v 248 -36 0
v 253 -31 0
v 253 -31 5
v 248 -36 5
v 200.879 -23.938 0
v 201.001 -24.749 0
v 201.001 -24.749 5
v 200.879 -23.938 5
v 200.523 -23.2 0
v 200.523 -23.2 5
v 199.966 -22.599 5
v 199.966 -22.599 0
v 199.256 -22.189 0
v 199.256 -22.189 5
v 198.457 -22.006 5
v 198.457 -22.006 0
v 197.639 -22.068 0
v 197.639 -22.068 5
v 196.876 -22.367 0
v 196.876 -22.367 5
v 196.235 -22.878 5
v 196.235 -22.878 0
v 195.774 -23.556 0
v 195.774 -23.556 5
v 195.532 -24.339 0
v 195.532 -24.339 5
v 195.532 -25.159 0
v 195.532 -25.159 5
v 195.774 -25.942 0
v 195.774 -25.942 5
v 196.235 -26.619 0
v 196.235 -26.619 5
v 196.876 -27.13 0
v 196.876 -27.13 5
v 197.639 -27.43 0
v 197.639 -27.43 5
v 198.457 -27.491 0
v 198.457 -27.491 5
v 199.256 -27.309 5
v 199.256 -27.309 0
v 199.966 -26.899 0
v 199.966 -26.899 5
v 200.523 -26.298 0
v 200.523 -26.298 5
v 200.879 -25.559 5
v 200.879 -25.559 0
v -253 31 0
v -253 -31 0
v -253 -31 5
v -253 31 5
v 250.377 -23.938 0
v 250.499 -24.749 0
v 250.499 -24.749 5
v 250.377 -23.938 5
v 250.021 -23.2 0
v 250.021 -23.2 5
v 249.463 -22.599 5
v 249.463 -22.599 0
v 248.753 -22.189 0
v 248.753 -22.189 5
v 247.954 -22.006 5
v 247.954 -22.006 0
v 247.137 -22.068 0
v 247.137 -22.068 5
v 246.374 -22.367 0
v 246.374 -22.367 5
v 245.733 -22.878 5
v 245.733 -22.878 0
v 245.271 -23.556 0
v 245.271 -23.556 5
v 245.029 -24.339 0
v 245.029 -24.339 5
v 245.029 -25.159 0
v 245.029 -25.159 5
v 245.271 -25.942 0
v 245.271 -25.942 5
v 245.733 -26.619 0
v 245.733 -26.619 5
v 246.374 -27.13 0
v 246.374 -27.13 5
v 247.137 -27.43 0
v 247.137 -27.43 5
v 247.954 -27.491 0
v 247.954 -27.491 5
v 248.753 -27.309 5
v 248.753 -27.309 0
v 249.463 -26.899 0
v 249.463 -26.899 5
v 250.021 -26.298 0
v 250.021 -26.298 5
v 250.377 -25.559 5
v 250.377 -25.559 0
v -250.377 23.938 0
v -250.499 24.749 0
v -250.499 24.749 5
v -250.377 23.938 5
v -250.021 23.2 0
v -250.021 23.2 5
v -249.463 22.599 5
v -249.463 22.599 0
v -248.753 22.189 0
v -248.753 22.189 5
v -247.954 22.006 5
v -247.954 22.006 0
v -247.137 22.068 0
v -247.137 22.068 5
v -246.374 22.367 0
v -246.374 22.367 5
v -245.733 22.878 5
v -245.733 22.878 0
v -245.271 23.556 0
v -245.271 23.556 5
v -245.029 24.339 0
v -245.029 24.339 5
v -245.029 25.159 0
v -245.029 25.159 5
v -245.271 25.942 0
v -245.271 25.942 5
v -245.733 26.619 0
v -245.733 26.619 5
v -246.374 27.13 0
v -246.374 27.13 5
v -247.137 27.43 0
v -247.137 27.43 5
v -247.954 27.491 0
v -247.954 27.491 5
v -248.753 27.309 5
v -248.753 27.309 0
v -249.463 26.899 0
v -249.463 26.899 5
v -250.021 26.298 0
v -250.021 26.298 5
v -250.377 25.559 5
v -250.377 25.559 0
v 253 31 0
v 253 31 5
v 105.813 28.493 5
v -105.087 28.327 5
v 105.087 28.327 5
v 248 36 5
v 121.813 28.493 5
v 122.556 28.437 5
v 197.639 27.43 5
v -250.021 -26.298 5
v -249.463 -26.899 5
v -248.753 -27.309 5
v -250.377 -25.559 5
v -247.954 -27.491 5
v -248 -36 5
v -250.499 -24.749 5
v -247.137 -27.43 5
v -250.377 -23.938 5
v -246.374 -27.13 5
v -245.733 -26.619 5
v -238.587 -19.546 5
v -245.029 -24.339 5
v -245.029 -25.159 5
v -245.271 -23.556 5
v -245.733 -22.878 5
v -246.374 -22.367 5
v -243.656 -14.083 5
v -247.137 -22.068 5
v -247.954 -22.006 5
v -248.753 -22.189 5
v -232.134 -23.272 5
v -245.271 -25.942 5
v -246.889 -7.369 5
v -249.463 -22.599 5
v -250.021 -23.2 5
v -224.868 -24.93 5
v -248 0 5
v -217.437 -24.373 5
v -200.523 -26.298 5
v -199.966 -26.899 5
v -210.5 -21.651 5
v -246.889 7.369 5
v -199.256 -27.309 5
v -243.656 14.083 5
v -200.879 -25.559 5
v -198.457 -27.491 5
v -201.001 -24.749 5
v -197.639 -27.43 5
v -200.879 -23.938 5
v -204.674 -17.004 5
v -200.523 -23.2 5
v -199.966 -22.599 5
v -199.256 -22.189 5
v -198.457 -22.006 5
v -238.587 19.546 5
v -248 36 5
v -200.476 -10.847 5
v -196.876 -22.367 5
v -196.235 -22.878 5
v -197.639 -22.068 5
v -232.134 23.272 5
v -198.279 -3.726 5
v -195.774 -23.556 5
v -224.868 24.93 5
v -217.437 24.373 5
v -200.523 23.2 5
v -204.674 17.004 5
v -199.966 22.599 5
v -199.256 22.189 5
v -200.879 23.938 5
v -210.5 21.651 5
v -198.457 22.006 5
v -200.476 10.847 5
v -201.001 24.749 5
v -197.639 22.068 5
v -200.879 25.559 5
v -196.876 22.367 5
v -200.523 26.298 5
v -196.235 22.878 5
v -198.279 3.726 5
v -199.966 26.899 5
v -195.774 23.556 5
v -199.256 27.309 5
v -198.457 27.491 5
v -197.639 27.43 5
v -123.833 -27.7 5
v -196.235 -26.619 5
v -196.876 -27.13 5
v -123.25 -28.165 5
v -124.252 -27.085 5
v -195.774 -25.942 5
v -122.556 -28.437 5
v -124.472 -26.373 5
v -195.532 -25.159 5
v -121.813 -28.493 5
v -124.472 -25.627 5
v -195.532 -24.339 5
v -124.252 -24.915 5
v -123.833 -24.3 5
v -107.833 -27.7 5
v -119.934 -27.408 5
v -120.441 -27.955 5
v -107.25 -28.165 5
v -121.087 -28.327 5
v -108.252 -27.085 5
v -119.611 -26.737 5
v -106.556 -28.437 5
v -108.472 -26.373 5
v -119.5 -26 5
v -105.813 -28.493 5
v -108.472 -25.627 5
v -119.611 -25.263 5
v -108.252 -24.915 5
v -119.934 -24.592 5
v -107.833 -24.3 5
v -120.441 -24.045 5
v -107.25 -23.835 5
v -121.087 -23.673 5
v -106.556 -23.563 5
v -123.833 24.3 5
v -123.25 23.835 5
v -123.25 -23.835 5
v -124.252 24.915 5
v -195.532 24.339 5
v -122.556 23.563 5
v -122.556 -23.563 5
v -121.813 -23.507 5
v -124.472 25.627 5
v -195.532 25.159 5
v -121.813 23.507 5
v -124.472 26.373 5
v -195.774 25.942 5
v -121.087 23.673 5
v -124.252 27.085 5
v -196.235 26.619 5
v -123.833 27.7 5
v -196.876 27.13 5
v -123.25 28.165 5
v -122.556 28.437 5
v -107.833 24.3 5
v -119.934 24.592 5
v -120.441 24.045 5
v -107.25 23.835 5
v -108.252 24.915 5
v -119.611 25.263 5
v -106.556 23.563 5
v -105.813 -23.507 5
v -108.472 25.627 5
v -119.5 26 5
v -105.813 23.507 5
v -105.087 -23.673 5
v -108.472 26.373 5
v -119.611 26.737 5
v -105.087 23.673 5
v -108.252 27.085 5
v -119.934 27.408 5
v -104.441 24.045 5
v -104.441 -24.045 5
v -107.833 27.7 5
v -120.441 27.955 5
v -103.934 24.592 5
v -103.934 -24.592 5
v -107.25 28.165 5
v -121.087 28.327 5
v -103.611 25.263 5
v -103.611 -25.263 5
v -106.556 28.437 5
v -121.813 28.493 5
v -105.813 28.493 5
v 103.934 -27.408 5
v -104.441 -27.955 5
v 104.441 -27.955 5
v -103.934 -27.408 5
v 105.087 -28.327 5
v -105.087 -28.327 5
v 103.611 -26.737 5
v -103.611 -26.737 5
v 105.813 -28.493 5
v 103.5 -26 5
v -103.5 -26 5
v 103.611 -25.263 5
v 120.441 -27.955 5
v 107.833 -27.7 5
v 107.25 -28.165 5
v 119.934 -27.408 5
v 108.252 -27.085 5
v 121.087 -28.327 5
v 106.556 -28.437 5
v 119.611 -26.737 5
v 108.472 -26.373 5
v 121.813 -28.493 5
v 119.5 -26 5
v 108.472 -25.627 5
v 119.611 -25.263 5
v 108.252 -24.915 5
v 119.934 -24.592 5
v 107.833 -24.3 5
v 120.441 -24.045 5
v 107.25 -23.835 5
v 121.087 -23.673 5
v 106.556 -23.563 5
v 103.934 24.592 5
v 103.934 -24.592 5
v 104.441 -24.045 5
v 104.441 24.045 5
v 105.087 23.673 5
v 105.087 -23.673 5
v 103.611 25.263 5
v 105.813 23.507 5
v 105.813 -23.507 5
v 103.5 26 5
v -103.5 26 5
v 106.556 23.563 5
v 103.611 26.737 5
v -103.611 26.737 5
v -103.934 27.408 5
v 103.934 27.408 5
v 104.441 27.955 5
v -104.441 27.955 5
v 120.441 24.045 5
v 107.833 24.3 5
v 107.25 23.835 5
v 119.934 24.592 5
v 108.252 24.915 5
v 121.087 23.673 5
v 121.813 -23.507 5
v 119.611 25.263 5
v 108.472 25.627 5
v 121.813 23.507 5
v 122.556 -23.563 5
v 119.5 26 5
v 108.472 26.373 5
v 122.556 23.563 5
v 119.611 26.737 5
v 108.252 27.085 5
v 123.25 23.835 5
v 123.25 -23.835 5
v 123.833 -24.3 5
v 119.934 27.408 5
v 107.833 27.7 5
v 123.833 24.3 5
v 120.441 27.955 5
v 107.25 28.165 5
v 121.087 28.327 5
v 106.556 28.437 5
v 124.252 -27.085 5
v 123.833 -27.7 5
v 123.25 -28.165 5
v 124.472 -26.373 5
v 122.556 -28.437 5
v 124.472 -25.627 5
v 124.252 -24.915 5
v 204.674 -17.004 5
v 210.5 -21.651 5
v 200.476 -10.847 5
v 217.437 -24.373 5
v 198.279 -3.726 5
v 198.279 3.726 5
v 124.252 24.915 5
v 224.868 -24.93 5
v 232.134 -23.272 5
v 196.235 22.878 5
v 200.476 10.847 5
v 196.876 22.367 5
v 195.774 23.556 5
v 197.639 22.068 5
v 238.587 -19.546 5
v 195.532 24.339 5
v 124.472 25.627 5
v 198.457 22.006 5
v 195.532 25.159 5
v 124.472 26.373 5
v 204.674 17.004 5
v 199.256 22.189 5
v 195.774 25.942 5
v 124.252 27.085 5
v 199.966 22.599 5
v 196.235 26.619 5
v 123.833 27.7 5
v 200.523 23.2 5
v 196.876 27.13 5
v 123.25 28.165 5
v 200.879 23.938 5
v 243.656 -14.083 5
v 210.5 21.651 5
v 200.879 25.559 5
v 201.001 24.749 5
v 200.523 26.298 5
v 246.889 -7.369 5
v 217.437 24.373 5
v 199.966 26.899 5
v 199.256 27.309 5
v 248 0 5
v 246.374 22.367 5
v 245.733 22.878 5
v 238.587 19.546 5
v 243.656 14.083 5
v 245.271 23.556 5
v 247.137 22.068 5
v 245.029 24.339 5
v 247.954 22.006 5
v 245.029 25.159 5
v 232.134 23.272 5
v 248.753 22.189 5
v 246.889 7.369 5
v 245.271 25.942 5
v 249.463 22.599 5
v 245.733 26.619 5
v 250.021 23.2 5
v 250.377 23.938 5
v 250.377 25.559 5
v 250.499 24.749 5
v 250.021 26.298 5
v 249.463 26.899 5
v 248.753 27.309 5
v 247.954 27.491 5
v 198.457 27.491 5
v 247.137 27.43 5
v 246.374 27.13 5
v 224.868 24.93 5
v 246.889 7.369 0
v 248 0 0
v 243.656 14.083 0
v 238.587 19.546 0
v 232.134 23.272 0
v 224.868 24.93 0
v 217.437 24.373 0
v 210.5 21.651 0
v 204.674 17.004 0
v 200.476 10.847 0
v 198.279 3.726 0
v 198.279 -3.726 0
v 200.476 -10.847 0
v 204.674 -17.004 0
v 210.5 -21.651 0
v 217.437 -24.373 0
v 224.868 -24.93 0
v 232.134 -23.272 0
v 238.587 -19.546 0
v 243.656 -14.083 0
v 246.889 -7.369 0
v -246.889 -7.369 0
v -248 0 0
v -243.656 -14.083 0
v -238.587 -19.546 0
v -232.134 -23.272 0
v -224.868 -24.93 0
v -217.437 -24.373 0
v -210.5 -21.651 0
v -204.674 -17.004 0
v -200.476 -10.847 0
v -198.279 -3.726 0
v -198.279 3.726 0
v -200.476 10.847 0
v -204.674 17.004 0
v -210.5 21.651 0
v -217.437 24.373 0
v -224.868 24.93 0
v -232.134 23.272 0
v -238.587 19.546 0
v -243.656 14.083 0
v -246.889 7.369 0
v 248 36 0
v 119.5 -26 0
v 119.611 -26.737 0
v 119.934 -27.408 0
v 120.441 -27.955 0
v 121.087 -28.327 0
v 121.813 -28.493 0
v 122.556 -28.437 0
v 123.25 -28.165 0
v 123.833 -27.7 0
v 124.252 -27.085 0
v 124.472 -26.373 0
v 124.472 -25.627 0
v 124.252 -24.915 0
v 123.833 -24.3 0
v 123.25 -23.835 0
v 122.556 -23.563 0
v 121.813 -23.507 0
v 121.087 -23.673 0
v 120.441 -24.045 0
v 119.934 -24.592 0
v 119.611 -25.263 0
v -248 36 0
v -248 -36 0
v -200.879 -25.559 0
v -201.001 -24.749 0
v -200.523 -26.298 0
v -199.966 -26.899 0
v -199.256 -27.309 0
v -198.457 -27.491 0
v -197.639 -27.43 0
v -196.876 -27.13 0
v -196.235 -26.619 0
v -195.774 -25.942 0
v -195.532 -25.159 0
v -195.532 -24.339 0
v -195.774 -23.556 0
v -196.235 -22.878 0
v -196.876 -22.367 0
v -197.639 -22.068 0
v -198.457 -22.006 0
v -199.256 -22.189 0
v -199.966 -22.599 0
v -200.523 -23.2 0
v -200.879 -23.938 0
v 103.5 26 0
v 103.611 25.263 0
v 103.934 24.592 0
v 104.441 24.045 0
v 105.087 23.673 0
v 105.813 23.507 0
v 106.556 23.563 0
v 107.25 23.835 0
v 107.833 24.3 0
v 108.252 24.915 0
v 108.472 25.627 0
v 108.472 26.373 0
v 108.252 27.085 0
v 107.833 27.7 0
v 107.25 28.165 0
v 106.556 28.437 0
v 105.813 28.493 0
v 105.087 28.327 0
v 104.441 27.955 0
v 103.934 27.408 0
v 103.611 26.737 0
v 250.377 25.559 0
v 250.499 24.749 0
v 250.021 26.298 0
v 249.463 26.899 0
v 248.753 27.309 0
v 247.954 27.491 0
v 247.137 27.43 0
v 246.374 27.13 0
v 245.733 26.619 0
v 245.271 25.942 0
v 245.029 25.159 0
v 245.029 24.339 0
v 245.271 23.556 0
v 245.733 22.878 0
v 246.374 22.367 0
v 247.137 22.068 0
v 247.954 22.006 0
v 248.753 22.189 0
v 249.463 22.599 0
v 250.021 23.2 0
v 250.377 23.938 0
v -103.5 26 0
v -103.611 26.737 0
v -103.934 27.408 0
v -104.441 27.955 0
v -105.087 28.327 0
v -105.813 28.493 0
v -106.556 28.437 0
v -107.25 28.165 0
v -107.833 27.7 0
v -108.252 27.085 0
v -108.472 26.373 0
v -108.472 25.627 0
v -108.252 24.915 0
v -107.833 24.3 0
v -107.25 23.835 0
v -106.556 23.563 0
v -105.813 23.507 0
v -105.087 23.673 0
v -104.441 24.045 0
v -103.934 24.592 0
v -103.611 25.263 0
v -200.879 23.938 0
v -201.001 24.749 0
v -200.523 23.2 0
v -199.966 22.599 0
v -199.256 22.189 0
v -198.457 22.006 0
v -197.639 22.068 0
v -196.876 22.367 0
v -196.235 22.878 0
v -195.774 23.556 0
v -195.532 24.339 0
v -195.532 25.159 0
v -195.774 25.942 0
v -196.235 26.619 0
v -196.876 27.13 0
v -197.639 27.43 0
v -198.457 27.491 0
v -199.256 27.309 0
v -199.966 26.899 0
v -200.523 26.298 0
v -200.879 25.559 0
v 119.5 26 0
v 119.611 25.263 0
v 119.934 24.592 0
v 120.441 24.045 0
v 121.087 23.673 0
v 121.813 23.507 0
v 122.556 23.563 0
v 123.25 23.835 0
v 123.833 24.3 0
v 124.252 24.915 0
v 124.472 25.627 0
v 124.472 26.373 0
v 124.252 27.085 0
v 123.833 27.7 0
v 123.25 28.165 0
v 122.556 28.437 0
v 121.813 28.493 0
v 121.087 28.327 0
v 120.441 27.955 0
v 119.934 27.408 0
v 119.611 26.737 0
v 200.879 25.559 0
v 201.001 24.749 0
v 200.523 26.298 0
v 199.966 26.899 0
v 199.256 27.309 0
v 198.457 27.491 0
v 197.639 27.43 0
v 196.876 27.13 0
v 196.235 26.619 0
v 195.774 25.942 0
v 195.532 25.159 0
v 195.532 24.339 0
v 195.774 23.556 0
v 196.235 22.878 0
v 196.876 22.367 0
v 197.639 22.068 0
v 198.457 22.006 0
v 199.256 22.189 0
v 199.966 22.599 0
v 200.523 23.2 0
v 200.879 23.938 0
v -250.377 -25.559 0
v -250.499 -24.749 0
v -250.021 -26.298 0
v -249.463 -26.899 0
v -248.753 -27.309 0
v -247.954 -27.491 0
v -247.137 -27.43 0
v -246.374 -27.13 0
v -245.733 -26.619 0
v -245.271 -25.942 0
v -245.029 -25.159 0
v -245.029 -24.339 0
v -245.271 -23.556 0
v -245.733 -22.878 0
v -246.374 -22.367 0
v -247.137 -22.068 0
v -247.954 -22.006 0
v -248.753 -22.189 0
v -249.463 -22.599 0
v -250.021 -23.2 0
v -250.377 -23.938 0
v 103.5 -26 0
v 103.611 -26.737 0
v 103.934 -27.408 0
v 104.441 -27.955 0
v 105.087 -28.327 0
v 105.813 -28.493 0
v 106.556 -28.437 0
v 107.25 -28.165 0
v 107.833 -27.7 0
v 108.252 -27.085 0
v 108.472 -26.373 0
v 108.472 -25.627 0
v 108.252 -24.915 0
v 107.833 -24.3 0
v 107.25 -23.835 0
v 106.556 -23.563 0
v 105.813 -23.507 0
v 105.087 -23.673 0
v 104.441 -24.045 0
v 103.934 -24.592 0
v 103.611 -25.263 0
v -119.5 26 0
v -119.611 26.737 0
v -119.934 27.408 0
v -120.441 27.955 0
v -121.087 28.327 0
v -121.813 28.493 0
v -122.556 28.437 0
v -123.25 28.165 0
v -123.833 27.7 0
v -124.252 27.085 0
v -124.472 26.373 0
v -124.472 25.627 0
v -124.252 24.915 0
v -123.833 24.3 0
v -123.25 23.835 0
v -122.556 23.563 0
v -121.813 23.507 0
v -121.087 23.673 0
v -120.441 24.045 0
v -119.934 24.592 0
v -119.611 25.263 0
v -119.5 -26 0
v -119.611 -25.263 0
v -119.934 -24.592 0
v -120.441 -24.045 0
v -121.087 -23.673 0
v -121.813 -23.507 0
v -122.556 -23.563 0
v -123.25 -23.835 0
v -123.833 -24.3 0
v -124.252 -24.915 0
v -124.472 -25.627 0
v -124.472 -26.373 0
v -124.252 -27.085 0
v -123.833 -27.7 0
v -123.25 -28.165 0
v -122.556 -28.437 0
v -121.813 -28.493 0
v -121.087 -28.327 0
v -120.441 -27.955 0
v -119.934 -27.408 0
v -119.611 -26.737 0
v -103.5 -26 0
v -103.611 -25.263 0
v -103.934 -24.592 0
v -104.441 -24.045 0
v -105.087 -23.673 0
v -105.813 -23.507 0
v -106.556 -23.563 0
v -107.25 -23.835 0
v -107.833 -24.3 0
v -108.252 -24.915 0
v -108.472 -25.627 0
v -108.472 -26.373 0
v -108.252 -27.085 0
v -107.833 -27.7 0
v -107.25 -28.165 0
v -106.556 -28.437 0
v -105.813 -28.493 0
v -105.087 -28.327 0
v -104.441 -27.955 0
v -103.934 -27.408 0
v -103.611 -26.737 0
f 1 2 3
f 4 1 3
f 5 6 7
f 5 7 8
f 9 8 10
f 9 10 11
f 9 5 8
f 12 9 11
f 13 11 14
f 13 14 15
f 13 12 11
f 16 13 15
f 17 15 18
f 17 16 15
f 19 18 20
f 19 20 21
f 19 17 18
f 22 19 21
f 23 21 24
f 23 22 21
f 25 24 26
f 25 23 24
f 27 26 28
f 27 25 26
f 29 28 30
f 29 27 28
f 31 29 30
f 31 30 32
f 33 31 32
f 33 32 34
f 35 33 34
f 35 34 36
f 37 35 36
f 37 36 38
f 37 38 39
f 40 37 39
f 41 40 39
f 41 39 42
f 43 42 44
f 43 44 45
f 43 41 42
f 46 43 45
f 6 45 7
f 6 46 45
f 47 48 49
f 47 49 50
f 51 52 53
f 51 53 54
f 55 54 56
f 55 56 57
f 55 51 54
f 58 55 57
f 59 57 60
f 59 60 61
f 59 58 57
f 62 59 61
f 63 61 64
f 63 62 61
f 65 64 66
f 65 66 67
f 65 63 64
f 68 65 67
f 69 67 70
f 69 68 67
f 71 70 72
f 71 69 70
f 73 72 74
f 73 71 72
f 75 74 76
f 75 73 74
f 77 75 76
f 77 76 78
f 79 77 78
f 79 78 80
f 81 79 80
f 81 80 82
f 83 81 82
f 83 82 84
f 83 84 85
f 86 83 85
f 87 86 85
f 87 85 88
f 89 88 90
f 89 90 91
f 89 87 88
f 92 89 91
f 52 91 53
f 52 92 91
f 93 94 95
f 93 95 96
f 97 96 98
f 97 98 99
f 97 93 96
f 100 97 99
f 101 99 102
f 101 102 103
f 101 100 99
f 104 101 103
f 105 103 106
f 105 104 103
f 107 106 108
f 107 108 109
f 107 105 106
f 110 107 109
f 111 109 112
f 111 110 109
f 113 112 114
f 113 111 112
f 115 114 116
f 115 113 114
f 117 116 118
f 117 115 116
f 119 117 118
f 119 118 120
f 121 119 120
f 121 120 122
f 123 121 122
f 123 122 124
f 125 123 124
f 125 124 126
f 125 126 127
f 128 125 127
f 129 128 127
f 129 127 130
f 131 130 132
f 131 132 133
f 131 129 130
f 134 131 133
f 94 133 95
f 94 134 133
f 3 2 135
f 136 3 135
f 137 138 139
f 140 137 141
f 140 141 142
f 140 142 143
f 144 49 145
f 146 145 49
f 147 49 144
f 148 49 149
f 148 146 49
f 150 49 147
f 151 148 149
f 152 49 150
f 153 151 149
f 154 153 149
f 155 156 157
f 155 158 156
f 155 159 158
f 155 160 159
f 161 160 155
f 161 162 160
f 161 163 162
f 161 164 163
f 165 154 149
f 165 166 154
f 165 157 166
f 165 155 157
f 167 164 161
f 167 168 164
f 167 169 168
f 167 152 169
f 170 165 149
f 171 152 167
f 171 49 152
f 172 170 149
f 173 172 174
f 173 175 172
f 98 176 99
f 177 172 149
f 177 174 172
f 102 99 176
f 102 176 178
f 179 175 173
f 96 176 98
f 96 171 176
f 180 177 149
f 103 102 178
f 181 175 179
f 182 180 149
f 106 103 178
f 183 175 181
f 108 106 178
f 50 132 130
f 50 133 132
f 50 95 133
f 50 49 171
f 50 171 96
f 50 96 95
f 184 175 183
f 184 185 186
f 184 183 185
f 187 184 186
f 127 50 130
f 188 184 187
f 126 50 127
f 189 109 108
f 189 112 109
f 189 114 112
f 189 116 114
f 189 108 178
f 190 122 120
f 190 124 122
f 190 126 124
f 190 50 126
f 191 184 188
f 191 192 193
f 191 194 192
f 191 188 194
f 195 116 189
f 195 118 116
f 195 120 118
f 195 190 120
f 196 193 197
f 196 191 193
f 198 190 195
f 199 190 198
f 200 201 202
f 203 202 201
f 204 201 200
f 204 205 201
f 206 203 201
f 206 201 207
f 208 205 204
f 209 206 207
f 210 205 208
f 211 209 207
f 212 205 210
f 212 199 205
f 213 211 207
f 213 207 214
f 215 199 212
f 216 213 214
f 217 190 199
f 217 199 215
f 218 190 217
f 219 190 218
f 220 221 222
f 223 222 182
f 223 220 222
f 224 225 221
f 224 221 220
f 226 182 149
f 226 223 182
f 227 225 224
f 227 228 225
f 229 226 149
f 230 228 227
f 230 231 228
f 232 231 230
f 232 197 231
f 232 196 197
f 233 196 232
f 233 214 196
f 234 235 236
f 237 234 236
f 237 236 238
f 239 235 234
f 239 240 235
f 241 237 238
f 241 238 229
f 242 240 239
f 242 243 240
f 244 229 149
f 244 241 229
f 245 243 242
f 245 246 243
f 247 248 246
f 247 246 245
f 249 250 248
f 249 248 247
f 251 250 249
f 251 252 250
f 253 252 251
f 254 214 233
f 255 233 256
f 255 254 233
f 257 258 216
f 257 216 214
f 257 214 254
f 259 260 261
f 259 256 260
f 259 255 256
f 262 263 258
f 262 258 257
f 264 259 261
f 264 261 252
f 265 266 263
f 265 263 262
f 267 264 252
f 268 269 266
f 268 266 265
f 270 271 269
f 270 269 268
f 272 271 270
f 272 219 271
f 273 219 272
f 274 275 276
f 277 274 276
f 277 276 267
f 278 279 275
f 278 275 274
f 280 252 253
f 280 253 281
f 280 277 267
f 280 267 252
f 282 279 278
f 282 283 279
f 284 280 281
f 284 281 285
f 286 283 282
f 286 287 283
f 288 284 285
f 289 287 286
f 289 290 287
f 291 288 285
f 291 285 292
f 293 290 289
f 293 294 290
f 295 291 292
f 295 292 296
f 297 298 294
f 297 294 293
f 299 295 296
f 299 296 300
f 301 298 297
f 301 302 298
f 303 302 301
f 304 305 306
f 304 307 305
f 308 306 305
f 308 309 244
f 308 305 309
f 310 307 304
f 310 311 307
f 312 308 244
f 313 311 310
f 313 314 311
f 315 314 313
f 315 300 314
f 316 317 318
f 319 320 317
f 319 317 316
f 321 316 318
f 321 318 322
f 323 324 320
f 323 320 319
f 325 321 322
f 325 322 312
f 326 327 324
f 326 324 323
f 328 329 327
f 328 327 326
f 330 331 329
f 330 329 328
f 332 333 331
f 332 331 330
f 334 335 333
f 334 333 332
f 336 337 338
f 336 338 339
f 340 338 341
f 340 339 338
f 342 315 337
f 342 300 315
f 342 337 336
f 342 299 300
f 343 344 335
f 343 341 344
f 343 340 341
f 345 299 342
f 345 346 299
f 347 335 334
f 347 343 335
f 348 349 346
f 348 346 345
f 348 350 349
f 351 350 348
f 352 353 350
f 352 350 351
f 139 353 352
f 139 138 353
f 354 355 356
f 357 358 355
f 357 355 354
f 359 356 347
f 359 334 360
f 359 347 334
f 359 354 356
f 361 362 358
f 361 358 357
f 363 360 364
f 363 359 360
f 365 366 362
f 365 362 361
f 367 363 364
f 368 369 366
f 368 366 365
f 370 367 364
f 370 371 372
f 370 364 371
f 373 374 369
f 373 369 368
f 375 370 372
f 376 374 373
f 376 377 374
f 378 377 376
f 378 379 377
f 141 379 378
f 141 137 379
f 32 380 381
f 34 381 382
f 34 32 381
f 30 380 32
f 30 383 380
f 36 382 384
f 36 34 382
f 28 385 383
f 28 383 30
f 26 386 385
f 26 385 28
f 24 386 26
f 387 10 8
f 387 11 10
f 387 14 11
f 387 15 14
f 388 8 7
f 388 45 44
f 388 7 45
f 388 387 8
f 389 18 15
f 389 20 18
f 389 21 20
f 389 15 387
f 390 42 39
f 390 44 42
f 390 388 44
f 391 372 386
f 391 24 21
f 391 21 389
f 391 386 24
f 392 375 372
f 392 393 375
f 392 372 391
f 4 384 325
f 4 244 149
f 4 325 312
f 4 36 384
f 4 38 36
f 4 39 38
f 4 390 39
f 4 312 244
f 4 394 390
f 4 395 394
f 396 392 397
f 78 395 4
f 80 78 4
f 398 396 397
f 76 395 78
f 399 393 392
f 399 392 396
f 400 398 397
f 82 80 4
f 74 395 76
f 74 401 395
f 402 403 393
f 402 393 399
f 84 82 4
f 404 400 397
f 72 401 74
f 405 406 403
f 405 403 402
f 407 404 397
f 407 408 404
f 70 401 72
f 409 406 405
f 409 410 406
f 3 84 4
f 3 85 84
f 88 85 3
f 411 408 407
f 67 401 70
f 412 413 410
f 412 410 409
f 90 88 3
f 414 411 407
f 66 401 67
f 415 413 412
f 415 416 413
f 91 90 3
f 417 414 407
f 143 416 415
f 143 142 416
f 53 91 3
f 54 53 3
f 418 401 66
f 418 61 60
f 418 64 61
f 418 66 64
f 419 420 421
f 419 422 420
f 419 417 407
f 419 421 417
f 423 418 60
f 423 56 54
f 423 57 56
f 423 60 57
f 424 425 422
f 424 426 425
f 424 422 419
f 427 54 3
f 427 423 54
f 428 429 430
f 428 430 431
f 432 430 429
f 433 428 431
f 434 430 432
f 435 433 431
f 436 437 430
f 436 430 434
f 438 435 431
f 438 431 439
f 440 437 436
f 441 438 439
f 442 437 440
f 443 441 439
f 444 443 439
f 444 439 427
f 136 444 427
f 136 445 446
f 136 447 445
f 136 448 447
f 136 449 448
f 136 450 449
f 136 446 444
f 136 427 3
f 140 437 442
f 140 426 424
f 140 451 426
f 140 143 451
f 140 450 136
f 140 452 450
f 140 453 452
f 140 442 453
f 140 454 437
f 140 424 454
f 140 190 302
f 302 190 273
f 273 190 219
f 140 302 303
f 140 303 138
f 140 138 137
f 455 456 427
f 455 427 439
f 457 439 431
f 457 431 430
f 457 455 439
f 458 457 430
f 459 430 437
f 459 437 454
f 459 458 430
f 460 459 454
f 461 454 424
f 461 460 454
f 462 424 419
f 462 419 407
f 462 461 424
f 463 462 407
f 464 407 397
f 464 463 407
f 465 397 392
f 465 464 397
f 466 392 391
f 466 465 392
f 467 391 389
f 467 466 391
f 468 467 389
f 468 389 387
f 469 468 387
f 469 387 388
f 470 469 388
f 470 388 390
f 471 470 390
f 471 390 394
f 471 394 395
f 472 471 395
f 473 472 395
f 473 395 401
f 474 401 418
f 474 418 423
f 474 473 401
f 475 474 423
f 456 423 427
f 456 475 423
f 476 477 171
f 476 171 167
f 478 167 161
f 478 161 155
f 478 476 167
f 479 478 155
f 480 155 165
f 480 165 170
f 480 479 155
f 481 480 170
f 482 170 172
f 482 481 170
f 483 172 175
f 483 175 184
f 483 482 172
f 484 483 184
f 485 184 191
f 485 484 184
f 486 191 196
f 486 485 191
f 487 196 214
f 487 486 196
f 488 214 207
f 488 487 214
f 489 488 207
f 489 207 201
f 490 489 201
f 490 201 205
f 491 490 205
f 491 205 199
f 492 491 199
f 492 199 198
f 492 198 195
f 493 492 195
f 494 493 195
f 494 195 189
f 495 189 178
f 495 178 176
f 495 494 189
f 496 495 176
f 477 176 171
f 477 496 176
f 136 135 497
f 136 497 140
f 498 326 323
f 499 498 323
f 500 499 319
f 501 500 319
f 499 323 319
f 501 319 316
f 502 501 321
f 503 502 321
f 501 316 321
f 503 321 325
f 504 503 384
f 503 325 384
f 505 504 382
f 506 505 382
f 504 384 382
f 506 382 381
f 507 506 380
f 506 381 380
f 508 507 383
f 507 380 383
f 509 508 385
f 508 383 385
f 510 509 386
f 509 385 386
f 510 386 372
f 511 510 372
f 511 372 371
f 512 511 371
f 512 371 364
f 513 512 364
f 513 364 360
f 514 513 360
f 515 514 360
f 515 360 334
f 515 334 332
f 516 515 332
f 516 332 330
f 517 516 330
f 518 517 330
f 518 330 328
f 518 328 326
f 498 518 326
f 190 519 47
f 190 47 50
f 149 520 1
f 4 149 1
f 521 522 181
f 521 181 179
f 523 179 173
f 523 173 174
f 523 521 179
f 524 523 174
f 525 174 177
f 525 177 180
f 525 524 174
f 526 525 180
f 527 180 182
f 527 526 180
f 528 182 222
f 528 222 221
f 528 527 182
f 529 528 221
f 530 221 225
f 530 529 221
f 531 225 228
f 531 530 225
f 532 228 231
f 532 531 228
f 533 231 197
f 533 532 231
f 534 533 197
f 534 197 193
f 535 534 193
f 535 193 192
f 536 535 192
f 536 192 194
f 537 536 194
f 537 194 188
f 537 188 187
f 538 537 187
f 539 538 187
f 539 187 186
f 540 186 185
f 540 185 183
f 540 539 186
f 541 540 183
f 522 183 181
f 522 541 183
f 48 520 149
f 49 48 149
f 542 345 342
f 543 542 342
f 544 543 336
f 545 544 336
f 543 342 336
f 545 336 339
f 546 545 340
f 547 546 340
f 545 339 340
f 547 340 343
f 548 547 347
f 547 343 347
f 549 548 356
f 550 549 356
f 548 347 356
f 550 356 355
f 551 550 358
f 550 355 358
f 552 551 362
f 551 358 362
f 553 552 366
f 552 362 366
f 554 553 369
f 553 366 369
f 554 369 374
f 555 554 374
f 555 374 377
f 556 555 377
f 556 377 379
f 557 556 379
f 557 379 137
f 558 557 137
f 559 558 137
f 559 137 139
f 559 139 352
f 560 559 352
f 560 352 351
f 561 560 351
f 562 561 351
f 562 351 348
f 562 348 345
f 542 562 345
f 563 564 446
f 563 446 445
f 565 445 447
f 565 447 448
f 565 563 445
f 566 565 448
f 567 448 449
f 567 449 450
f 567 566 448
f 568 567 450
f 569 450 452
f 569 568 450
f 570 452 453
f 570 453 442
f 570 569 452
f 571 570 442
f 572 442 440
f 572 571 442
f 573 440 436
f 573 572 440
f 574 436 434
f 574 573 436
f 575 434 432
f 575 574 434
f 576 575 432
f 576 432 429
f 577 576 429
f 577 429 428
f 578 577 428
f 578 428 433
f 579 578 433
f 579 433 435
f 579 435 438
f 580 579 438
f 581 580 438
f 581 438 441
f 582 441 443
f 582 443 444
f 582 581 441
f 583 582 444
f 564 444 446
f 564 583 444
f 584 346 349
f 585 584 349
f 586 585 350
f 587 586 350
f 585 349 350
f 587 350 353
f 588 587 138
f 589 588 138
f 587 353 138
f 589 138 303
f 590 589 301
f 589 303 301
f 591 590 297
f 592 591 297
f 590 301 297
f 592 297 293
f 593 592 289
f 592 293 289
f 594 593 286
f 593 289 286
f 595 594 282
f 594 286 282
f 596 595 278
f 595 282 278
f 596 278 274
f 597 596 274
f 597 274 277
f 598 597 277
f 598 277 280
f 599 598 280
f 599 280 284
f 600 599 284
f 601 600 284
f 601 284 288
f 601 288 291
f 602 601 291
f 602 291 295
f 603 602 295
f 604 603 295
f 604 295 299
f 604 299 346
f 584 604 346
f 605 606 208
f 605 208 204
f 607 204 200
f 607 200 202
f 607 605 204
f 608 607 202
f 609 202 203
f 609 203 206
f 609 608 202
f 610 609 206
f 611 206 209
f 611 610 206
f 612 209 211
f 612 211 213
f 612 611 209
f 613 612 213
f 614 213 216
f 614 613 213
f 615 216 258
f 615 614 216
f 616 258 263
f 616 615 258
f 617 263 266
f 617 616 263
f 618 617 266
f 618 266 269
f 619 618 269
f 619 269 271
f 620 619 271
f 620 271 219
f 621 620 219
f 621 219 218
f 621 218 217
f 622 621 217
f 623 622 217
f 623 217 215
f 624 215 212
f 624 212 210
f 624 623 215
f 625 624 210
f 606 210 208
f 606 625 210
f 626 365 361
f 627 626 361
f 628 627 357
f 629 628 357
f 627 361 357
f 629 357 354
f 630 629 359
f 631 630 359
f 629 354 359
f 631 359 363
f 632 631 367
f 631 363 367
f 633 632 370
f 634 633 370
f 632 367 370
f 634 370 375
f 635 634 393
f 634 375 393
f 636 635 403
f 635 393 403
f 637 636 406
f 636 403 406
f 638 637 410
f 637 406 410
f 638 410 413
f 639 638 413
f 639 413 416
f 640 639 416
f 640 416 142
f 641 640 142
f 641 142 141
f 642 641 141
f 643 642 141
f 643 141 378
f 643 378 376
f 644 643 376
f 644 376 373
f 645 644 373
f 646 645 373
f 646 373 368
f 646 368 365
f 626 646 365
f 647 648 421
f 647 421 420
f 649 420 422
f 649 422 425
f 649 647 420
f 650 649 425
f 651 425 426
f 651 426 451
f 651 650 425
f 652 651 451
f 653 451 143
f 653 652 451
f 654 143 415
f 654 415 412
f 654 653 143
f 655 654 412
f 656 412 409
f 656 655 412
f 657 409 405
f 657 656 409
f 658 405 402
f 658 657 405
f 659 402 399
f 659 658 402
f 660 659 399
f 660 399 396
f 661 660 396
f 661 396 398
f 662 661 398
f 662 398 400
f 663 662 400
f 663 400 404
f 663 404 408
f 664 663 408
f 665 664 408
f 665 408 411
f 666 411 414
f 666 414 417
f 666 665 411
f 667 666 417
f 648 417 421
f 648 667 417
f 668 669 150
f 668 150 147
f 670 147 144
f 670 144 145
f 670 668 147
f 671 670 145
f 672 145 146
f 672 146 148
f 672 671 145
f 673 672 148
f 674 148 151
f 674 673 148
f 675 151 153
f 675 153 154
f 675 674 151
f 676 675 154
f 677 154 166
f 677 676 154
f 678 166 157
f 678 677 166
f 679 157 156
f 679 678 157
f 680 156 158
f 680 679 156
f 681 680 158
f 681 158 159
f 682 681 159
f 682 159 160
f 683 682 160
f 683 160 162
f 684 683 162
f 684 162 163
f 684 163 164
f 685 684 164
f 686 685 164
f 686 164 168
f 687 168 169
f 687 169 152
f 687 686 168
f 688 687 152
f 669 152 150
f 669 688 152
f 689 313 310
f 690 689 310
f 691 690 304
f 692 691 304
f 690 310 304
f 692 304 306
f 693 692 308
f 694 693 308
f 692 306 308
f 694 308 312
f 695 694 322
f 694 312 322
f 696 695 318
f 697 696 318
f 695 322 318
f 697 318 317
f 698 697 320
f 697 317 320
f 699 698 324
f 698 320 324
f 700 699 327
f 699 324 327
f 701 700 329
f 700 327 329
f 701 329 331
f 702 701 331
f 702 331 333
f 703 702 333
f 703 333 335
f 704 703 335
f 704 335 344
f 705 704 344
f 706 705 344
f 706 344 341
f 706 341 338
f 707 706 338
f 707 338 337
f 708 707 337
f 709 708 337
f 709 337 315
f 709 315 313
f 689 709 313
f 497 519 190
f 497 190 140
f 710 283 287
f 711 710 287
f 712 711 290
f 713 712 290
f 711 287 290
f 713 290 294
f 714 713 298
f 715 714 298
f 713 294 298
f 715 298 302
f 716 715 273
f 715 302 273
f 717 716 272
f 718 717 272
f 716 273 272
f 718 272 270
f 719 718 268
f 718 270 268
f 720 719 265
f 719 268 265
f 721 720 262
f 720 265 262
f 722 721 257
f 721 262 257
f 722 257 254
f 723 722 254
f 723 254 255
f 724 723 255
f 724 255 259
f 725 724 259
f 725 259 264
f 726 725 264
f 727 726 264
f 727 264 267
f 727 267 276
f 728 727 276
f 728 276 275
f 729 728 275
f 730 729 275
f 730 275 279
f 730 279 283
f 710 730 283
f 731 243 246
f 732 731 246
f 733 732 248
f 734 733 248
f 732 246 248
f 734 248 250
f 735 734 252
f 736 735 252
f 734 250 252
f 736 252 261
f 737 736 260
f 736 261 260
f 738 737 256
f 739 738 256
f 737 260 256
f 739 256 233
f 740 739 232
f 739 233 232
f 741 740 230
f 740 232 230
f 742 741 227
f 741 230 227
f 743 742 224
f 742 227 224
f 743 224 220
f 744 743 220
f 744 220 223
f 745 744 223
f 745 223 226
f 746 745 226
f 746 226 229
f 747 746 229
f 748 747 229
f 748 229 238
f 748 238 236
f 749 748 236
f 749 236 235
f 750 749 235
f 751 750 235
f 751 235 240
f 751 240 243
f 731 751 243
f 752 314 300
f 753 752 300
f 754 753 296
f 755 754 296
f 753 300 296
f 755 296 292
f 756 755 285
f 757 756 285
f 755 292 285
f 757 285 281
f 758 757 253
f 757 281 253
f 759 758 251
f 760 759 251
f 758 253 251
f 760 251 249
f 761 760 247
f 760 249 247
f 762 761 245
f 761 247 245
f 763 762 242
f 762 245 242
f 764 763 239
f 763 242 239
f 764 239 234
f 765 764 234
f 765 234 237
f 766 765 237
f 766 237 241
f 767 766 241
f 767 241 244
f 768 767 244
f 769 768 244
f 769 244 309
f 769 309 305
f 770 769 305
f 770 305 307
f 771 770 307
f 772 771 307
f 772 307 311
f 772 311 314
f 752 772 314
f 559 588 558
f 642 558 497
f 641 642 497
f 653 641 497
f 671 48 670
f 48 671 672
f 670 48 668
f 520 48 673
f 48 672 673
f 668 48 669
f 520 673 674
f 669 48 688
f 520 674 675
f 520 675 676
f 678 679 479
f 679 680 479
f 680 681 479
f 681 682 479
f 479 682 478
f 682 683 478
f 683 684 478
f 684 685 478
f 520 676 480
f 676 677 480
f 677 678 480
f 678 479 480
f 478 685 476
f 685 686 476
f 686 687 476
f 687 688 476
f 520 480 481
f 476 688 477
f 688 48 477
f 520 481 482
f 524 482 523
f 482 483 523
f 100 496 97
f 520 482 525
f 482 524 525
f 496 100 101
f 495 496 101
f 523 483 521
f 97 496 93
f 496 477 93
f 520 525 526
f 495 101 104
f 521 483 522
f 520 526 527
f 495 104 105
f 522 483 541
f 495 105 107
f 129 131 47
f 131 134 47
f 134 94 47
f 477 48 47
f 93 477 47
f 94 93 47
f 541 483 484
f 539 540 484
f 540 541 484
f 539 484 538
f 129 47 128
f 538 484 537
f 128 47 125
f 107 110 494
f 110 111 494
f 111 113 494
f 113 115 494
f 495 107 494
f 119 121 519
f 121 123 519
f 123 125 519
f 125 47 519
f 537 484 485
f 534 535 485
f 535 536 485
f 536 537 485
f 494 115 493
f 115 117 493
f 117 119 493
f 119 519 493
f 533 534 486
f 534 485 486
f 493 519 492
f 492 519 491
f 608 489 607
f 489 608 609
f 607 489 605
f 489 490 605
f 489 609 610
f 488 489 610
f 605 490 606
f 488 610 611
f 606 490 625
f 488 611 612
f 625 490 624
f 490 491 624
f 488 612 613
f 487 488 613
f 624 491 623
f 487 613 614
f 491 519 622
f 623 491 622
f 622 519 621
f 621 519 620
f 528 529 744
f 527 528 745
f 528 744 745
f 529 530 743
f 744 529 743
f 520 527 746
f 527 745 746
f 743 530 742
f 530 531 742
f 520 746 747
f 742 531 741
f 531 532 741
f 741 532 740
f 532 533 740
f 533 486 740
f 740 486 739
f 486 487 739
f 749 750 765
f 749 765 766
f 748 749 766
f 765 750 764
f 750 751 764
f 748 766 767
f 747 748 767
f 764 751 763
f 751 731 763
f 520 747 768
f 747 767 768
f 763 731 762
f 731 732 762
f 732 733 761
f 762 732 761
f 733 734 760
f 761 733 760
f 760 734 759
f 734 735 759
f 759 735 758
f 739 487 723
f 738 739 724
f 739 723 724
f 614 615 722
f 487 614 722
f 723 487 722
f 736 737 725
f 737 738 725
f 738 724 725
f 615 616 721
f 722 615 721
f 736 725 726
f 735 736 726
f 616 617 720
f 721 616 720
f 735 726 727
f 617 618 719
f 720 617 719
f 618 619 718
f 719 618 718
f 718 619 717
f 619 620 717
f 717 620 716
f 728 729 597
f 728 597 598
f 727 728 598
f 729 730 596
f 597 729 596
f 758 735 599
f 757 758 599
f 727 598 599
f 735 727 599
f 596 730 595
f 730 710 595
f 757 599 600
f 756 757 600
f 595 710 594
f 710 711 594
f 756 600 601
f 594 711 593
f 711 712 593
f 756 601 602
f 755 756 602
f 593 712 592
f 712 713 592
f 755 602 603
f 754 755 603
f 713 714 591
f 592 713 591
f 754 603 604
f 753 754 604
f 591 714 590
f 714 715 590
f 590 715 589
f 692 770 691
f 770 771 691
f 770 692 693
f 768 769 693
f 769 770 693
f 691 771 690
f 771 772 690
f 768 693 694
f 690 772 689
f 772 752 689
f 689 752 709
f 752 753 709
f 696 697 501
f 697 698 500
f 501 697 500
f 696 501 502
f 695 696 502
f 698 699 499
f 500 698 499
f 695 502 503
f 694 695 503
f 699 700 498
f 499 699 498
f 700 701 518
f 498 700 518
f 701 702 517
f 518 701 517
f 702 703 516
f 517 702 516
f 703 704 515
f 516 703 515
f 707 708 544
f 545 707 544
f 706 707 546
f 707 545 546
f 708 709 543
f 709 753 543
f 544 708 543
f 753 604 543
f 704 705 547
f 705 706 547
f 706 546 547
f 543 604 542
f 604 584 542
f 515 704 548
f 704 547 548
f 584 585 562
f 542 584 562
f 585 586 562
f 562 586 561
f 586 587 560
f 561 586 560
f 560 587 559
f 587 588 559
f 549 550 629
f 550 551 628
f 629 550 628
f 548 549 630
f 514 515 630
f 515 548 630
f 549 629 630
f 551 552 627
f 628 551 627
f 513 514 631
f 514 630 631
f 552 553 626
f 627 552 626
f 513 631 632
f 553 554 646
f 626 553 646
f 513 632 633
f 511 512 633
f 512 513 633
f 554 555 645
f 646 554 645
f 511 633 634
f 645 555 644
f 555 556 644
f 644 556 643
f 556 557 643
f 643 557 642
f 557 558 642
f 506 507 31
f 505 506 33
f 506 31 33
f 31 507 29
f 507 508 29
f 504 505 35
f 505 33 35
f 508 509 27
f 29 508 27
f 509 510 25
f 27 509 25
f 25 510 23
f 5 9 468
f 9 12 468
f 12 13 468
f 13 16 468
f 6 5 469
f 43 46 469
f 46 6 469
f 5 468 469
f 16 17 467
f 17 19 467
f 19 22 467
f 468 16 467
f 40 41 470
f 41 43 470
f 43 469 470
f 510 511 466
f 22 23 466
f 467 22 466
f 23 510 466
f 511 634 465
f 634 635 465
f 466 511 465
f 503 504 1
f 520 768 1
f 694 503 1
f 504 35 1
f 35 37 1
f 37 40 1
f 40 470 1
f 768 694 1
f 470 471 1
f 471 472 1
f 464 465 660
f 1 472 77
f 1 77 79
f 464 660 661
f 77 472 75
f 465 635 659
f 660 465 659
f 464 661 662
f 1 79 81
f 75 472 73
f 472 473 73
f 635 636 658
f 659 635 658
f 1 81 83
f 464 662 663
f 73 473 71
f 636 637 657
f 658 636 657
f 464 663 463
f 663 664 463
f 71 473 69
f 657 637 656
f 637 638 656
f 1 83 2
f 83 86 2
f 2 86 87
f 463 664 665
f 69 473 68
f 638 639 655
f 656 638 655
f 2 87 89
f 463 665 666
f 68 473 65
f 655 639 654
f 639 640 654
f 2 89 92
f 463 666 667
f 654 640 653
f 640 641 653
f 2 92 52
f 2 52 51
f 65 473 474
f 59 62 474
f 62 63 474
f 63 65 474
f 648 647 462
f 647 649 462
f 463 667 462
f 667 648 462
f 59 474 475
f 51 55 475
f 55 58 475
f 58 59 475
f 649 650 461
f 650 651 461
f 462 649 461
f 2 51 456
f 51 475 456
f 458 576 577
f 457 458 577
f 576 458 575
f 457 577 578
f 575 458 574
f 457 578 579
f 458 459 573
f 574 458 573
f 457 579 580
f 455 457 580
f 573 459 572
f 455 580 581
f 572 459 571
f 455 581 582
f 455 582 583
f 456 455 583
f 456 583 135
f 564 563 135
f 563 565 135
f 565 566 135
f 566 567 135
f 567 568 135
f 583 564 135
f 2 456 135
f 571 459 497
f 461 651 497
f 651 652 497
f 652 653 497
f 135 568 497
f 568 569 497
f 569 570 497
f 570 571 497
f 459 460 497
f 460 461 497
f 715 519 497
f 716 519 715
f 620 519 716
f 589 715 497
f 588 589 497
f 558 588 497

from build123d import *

# Parameters (mm, degrees)
SKETCH_1_W          = 506
SKETCH_1_H          = 72
SKETCH_1_R          = 25
SKETCH_1_R_2        = 2.75
EXTRUDE_1_DEPTH     = 5
CHAMFER_1_SIZE      = 5
SKETCH_2_R          = 2.5
CUT_EXTRUDE_1_DEPTH = 256.597339579


with BuildPart() as part:
    # 草图1 → 凸台-拉伸1 (new body)
    with BuildSketch(Plane.XY):
        Rectangle(SKETCH_1_W, SKETCH_1_H)
        with Locations((223, 0)):
            Circle(SKETCH_1_R, mode=Mode.SUBTRACT)
        with Locations((247.748737342, 24.748737342)):
            Circle(SKETCH_1_R_2, mode=Mode.SUBTRACT)
        with Locations((198.251262658, 24.748737342)):
            Circle(SKETCH_1_R_2, mode=Mode.SUBTRACT)
        with Locations((198.251262658, -24.748737342)):
            Circle(SKETCH_1_R_2, mode=Mode.SUBTRACT)
        with Locations((247.748737342, -24.748737342)):
            Circle(SKETCH_1_R_2, mode=Mode.SUBTRACT)
        with Locations(Location((-247.748737342, -24.748737342, 0), (0, 0, 180))):
            Circle(SKETCH_1_R_2, mode=Mode.SUBTRACT)
        with Locations(Location((-247.748737342, 24.748737342, 0), (0, 0, 180))):
            Circle(SKETCH_1_R_2, mode=Mode.SUBTRACT)
        with Locations(Location((-198.251262658, 24.748737342, 0), (0, 0, 180))):
            Circle(SKETCH_1_R_2, mode=Mode.SUBTRACT)
        with Locations(Location((-198.251262658, -24.748737342, 0), (0, 0, 180))):
            Circle(SKETCH_1_R_2, mode=Mode.SUBTRACT)
        with Locations(Location((-223, 0, 0), (0, 0, 180))):
            Circle(SKETCH_1_R, mode=Mode.SUBTRACT)
    extrude(amount=EXTRUDE_1_DEPTH)

    # 倒角1
    chamfer_1_edges = [part.edges().sort_by_distance(p)[0] for p in [
        (-253, 36, 2.5),
        (253, 36, 2.5),
        (253, -36, 2.5),
        (-253, -36, 2.5),
    ]]
    chamfer(chamfer_1_edges, length=CHAMFER_1_SIZE)

    # 草图2 → 切除-拉伸1 (cut, through all)
    with BuildSketch(Plane.XY.offset(5)):
        with Locations((-122, 26)):
            Circle(SKETCH_2_R)
        with Locations((-122, -26)):
            Circle(SKETCH_2_R)
        with Locations((-106, 26)):
            Circle(SKETCH_2_R)
        with Locations((-106, -26)):
            Circle(SKETCH_2_R)
        with Locations(Location((106, -26, 0), (0, 0, 180))):
            Circle(SKETCH_2_R)
        with Locations(Location((106, 26, 0), (0, 0, 180))):
            Circle(SKETCH_2_R)
        with Locations(Location((122, -26, 0), (0, 0, 180))):
            Circle(SKETCH_2_R)
        with Locations(Location((122, 26, 0), (0, 0, 180))):
            Circle(SKETCH_2_R)
    extrude(amount=-CUT_EXTRUDE_1_DEPTH, mode=Mode.SUBTRACT)


solid = part.part
